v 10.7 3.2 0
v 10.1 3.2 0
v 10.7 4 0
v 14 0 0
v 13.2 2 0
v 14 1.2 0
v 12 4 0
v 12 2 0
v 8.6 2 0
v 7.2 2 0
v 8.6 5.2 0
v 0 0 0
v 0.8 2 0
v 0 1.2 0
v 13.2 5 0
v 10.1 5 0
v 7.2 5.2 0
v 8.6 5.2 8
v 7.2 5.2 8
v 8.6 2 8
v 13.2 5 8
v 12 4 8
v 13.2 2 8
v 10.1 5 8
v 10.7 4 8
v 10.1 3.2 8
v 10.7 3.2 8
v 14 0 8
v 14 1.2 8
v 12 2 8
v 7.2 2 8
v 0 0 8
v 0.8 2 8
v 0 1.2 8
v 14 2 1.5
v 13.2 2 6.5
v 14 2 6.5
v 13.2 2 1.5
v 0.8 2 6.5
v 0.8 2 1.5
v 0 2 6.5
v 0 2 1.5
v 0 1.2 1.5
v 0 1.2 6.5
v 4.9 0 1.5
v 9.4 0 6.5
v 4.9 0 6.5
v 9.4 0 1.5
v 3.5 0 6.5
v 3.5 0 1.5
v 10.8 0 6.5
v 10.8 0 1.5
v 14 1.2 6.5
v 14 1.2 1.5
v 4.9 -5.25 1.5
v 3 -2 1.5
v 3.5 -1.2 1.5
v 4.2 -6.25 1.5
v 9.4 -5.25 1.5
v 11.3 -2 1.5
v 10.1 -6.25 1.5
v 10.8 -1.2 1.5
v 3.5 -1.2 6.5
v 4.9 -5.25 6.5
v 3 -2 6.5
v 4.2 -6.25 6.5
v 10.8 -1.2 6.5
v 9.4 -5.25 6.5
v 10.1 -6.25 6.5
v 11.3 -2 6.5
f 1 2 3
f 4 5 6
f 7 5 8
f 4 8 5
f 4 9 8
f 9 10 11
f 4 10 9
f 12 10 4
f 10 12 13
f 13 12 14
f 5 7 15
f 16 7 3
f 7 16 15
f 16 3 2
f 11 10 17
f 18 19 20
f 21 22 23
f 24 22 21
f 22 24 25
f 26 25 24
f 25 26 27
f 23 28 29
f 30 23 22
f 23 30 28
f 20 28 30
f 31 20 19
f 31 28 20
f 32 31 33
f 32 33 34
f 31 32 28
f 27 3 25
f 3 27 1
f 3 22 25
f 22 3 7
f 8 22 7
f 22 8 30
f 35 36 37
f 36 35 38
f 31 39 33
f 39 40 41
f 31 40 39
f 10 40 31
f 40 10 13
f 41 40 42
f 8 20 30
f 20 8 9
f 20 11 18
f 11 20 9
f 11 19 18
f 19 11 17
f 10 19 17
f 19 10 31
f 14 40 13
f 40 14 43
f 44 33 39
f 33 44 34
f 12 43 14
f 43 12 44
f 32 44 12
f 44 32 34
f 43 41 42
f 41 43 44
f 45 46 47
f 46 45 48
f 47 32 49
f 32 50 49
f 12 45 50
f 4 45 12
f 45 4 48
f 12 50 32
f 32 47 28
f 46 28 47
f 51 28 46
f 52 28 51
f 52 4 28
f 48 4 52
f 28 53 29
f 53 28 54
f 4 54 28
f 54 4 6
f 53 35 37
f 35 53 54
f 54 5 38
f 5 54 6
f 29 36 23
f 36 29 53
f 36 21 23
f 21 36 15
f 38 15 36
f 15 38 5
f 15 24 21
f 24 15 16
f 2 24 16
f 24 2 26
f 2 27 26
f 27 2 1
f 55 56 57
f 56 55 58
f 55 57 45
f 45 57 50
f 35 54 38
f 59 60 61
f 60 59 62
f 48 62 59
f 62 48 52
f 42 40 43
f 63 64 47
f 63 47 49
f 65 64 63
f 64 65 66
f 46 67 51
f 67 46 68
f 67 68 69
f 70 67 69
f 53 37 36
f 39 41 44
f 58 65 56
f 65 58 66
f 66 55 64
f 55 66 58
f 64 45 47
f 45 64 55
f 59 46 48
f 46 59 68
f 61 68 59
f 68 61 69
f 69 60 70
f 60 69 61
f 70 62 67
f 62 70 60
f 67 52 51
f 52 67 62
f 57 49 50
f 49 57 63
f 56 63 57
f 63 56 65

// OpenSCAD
// ---------------------------------------------------------------
// Space-bar stabilizer clip — Apple II clone keyboard
//
// ---------------------------------------------------------------

// ---- overall -------------------------------------------------
top_width     = 8.0;    // [measured] front-back width of body/post/hook
leg_top_width = 5.0;    // [measured] front-back width of legs (centered)
body_length   = 14.0;   // [measured] long edge sitting on the plate
body_height   = 2.0;    // thickness of body bar (profile height)
chamfer_left  = 0.8;    // 45-deg chamfer on top corners of the body,
chamfer_right = 0.8;    //   as seen in side_close.jpg; 0 = square

// ---- post (front stop for the wire, left of the hook) --------
post_x      = 7.2;      // left edge of post, from left end of body
post_width  = 1.4;
post_height = 3.2;      // [measured] visible vertical part above body

// ---- hook (retains the stab wire; opens down/left) -----------
hook_riser_x     = 12.0; // left edge of vertical riser
hook_riser_width = 1.2;
hook_height      = 3.0;  // top of hook above top of body
hook_arm         = 1;  // thickness of horizontal top arm
hook_lip_width   = 0.6;  // width of the down-turned lip at arm's end
hook_lip_depth   = 0.8;  // how far the lip hangs below the arm
wire_slot        = 1.3;  // channel for the wire: lip <-> riser
                         //   = wire diameter + ~0.1..0.2 clearance

// ---- snap legs (press into baseplate slots) ------------------
leg_width       = 1.4;
plate_thickness = 1.2;  // baseplate sheet thickness: barb catches
                        //   this far below the body underside
barb_depth      = 0.5;  // how far the barb flares past the leg side
barb_length     = 0.8;  // vertical run of the barb ramp below the catch
tip_taper       = 1.0;  // tapered spike tip, eases insertion

leg1_x      = 3.5;      // left edge of left leg
leg1_length = 6.25;     // [measured] body underside to tip
leg1_barb   = -.8;       // barb side: -1 = flares left, +1 = right

leg2_x      = 9.4;      // left edge of right leg
leg2_length = 6.25;     // [measured]
leg2_barb   = .8;

// ---- preview helpers -----------------------------------------
show_plate = true;      // ghost of the baseplate, to judge barb catch

// ===============================================================

body_top = body_height;

// entry gap the wire passes through, between post and hook lip
entry_gap = (hook_riser_x - wire_slot - hook_lip_width) - (post_x + post_width);
echo(str("wire entry gap (post to hook lip): ", entry_gap, " mm"));

// body bar with 45-deg chamfers on its top corners
module body2d() {
    polygon([
        [0, 0],
        [body_length, 0],
        [body_length, body_height - chamfer_right],
        [body_length - chamfer_right, body_height],
        [chamfer_left, body_height],
        [0, body_height - chamfer_left]
    ]);
}

module post2d() {
    translate([post_x, 0])
        square([post_width, body_top + post_height]);
}

module hook2d() {
    arm_left = hook_riser_x - wire_slot - hook_lip_width;
    // vertical riser
    translate([hook_riser_x, 0])
        square([hook_riser_width, body_top + hook_height]);
    // horizontal top arm, reaching left over the wire channel
    translate([arm_left, body_top + hook_height - hook_arm])
        square([hook_riser_x + hook_riser_width - arm_left, hook_arm]);
    // down-turned lip at the arm's left end
    translate([arm_left, body_top + hook_height - hook_arm - hook_lip_depth])
        square([hook_lip_width, hook_lip_depth]);
}

// Snap leg: straight shank through the plate, barbed catch below it,
// tapered spike tip. Catch face is slightly ramped so the clip can be
// levered back out without snapping (unlike the original...).
module leg2d(x, len, barb_side) {
    w = leg_width;
    cx = x + w / 2;                 // mirror axis for barb side
    pts = [
        [x,           0],
        [x + w,       0],
        [x + w,      -(len - tip_taper)],
        [cx,         -len],                                  // tip
        [x - barb_depth, -(plate_thickness + barb_length)],  // barb peak
        [x,          -plate_thickness]                       // catch
    ];
    // points above are for a left-flaring barb; mirror for right
    polygon(barb_side < 0 ? pts : [for (p = pts) [2 * cx - p[0], p[1]]]);
}

// everything above the plate: full 8 mm front-back width
module top_profile2d() {
    union() {
        body2d();
        post2d();
        hook2d();
    }
}

// snap legs: narrower, run through the plate slots
module legs2d() {
    leg2d(leg1_x, leg1_length, leg1_barb);
    leg2d(leg2_x, leg2_length, leg2_barb);
}

// ---- 3D part --------------------------------------------------
linear_extrude(height = top_width)
    top_profile2d();

// legs centered front-back under the body, overlapping slightly
// into the body so the union is watertight
translate([0, 0, (top_width - leg_top_width) / 2])
    linear_extrude(height = leg_top_width)
        union() {
            legs2d();
            translate([0, 0])
                square([body_length, body_height]);  // fuse into body
        }

// ghost baseplate under the body (preview only, not exported)
if (show_plate)
    %translate([-3, -plate_thickness, -2])
        cube([body_length + 6, plate_thickness, top_width + 4]);
